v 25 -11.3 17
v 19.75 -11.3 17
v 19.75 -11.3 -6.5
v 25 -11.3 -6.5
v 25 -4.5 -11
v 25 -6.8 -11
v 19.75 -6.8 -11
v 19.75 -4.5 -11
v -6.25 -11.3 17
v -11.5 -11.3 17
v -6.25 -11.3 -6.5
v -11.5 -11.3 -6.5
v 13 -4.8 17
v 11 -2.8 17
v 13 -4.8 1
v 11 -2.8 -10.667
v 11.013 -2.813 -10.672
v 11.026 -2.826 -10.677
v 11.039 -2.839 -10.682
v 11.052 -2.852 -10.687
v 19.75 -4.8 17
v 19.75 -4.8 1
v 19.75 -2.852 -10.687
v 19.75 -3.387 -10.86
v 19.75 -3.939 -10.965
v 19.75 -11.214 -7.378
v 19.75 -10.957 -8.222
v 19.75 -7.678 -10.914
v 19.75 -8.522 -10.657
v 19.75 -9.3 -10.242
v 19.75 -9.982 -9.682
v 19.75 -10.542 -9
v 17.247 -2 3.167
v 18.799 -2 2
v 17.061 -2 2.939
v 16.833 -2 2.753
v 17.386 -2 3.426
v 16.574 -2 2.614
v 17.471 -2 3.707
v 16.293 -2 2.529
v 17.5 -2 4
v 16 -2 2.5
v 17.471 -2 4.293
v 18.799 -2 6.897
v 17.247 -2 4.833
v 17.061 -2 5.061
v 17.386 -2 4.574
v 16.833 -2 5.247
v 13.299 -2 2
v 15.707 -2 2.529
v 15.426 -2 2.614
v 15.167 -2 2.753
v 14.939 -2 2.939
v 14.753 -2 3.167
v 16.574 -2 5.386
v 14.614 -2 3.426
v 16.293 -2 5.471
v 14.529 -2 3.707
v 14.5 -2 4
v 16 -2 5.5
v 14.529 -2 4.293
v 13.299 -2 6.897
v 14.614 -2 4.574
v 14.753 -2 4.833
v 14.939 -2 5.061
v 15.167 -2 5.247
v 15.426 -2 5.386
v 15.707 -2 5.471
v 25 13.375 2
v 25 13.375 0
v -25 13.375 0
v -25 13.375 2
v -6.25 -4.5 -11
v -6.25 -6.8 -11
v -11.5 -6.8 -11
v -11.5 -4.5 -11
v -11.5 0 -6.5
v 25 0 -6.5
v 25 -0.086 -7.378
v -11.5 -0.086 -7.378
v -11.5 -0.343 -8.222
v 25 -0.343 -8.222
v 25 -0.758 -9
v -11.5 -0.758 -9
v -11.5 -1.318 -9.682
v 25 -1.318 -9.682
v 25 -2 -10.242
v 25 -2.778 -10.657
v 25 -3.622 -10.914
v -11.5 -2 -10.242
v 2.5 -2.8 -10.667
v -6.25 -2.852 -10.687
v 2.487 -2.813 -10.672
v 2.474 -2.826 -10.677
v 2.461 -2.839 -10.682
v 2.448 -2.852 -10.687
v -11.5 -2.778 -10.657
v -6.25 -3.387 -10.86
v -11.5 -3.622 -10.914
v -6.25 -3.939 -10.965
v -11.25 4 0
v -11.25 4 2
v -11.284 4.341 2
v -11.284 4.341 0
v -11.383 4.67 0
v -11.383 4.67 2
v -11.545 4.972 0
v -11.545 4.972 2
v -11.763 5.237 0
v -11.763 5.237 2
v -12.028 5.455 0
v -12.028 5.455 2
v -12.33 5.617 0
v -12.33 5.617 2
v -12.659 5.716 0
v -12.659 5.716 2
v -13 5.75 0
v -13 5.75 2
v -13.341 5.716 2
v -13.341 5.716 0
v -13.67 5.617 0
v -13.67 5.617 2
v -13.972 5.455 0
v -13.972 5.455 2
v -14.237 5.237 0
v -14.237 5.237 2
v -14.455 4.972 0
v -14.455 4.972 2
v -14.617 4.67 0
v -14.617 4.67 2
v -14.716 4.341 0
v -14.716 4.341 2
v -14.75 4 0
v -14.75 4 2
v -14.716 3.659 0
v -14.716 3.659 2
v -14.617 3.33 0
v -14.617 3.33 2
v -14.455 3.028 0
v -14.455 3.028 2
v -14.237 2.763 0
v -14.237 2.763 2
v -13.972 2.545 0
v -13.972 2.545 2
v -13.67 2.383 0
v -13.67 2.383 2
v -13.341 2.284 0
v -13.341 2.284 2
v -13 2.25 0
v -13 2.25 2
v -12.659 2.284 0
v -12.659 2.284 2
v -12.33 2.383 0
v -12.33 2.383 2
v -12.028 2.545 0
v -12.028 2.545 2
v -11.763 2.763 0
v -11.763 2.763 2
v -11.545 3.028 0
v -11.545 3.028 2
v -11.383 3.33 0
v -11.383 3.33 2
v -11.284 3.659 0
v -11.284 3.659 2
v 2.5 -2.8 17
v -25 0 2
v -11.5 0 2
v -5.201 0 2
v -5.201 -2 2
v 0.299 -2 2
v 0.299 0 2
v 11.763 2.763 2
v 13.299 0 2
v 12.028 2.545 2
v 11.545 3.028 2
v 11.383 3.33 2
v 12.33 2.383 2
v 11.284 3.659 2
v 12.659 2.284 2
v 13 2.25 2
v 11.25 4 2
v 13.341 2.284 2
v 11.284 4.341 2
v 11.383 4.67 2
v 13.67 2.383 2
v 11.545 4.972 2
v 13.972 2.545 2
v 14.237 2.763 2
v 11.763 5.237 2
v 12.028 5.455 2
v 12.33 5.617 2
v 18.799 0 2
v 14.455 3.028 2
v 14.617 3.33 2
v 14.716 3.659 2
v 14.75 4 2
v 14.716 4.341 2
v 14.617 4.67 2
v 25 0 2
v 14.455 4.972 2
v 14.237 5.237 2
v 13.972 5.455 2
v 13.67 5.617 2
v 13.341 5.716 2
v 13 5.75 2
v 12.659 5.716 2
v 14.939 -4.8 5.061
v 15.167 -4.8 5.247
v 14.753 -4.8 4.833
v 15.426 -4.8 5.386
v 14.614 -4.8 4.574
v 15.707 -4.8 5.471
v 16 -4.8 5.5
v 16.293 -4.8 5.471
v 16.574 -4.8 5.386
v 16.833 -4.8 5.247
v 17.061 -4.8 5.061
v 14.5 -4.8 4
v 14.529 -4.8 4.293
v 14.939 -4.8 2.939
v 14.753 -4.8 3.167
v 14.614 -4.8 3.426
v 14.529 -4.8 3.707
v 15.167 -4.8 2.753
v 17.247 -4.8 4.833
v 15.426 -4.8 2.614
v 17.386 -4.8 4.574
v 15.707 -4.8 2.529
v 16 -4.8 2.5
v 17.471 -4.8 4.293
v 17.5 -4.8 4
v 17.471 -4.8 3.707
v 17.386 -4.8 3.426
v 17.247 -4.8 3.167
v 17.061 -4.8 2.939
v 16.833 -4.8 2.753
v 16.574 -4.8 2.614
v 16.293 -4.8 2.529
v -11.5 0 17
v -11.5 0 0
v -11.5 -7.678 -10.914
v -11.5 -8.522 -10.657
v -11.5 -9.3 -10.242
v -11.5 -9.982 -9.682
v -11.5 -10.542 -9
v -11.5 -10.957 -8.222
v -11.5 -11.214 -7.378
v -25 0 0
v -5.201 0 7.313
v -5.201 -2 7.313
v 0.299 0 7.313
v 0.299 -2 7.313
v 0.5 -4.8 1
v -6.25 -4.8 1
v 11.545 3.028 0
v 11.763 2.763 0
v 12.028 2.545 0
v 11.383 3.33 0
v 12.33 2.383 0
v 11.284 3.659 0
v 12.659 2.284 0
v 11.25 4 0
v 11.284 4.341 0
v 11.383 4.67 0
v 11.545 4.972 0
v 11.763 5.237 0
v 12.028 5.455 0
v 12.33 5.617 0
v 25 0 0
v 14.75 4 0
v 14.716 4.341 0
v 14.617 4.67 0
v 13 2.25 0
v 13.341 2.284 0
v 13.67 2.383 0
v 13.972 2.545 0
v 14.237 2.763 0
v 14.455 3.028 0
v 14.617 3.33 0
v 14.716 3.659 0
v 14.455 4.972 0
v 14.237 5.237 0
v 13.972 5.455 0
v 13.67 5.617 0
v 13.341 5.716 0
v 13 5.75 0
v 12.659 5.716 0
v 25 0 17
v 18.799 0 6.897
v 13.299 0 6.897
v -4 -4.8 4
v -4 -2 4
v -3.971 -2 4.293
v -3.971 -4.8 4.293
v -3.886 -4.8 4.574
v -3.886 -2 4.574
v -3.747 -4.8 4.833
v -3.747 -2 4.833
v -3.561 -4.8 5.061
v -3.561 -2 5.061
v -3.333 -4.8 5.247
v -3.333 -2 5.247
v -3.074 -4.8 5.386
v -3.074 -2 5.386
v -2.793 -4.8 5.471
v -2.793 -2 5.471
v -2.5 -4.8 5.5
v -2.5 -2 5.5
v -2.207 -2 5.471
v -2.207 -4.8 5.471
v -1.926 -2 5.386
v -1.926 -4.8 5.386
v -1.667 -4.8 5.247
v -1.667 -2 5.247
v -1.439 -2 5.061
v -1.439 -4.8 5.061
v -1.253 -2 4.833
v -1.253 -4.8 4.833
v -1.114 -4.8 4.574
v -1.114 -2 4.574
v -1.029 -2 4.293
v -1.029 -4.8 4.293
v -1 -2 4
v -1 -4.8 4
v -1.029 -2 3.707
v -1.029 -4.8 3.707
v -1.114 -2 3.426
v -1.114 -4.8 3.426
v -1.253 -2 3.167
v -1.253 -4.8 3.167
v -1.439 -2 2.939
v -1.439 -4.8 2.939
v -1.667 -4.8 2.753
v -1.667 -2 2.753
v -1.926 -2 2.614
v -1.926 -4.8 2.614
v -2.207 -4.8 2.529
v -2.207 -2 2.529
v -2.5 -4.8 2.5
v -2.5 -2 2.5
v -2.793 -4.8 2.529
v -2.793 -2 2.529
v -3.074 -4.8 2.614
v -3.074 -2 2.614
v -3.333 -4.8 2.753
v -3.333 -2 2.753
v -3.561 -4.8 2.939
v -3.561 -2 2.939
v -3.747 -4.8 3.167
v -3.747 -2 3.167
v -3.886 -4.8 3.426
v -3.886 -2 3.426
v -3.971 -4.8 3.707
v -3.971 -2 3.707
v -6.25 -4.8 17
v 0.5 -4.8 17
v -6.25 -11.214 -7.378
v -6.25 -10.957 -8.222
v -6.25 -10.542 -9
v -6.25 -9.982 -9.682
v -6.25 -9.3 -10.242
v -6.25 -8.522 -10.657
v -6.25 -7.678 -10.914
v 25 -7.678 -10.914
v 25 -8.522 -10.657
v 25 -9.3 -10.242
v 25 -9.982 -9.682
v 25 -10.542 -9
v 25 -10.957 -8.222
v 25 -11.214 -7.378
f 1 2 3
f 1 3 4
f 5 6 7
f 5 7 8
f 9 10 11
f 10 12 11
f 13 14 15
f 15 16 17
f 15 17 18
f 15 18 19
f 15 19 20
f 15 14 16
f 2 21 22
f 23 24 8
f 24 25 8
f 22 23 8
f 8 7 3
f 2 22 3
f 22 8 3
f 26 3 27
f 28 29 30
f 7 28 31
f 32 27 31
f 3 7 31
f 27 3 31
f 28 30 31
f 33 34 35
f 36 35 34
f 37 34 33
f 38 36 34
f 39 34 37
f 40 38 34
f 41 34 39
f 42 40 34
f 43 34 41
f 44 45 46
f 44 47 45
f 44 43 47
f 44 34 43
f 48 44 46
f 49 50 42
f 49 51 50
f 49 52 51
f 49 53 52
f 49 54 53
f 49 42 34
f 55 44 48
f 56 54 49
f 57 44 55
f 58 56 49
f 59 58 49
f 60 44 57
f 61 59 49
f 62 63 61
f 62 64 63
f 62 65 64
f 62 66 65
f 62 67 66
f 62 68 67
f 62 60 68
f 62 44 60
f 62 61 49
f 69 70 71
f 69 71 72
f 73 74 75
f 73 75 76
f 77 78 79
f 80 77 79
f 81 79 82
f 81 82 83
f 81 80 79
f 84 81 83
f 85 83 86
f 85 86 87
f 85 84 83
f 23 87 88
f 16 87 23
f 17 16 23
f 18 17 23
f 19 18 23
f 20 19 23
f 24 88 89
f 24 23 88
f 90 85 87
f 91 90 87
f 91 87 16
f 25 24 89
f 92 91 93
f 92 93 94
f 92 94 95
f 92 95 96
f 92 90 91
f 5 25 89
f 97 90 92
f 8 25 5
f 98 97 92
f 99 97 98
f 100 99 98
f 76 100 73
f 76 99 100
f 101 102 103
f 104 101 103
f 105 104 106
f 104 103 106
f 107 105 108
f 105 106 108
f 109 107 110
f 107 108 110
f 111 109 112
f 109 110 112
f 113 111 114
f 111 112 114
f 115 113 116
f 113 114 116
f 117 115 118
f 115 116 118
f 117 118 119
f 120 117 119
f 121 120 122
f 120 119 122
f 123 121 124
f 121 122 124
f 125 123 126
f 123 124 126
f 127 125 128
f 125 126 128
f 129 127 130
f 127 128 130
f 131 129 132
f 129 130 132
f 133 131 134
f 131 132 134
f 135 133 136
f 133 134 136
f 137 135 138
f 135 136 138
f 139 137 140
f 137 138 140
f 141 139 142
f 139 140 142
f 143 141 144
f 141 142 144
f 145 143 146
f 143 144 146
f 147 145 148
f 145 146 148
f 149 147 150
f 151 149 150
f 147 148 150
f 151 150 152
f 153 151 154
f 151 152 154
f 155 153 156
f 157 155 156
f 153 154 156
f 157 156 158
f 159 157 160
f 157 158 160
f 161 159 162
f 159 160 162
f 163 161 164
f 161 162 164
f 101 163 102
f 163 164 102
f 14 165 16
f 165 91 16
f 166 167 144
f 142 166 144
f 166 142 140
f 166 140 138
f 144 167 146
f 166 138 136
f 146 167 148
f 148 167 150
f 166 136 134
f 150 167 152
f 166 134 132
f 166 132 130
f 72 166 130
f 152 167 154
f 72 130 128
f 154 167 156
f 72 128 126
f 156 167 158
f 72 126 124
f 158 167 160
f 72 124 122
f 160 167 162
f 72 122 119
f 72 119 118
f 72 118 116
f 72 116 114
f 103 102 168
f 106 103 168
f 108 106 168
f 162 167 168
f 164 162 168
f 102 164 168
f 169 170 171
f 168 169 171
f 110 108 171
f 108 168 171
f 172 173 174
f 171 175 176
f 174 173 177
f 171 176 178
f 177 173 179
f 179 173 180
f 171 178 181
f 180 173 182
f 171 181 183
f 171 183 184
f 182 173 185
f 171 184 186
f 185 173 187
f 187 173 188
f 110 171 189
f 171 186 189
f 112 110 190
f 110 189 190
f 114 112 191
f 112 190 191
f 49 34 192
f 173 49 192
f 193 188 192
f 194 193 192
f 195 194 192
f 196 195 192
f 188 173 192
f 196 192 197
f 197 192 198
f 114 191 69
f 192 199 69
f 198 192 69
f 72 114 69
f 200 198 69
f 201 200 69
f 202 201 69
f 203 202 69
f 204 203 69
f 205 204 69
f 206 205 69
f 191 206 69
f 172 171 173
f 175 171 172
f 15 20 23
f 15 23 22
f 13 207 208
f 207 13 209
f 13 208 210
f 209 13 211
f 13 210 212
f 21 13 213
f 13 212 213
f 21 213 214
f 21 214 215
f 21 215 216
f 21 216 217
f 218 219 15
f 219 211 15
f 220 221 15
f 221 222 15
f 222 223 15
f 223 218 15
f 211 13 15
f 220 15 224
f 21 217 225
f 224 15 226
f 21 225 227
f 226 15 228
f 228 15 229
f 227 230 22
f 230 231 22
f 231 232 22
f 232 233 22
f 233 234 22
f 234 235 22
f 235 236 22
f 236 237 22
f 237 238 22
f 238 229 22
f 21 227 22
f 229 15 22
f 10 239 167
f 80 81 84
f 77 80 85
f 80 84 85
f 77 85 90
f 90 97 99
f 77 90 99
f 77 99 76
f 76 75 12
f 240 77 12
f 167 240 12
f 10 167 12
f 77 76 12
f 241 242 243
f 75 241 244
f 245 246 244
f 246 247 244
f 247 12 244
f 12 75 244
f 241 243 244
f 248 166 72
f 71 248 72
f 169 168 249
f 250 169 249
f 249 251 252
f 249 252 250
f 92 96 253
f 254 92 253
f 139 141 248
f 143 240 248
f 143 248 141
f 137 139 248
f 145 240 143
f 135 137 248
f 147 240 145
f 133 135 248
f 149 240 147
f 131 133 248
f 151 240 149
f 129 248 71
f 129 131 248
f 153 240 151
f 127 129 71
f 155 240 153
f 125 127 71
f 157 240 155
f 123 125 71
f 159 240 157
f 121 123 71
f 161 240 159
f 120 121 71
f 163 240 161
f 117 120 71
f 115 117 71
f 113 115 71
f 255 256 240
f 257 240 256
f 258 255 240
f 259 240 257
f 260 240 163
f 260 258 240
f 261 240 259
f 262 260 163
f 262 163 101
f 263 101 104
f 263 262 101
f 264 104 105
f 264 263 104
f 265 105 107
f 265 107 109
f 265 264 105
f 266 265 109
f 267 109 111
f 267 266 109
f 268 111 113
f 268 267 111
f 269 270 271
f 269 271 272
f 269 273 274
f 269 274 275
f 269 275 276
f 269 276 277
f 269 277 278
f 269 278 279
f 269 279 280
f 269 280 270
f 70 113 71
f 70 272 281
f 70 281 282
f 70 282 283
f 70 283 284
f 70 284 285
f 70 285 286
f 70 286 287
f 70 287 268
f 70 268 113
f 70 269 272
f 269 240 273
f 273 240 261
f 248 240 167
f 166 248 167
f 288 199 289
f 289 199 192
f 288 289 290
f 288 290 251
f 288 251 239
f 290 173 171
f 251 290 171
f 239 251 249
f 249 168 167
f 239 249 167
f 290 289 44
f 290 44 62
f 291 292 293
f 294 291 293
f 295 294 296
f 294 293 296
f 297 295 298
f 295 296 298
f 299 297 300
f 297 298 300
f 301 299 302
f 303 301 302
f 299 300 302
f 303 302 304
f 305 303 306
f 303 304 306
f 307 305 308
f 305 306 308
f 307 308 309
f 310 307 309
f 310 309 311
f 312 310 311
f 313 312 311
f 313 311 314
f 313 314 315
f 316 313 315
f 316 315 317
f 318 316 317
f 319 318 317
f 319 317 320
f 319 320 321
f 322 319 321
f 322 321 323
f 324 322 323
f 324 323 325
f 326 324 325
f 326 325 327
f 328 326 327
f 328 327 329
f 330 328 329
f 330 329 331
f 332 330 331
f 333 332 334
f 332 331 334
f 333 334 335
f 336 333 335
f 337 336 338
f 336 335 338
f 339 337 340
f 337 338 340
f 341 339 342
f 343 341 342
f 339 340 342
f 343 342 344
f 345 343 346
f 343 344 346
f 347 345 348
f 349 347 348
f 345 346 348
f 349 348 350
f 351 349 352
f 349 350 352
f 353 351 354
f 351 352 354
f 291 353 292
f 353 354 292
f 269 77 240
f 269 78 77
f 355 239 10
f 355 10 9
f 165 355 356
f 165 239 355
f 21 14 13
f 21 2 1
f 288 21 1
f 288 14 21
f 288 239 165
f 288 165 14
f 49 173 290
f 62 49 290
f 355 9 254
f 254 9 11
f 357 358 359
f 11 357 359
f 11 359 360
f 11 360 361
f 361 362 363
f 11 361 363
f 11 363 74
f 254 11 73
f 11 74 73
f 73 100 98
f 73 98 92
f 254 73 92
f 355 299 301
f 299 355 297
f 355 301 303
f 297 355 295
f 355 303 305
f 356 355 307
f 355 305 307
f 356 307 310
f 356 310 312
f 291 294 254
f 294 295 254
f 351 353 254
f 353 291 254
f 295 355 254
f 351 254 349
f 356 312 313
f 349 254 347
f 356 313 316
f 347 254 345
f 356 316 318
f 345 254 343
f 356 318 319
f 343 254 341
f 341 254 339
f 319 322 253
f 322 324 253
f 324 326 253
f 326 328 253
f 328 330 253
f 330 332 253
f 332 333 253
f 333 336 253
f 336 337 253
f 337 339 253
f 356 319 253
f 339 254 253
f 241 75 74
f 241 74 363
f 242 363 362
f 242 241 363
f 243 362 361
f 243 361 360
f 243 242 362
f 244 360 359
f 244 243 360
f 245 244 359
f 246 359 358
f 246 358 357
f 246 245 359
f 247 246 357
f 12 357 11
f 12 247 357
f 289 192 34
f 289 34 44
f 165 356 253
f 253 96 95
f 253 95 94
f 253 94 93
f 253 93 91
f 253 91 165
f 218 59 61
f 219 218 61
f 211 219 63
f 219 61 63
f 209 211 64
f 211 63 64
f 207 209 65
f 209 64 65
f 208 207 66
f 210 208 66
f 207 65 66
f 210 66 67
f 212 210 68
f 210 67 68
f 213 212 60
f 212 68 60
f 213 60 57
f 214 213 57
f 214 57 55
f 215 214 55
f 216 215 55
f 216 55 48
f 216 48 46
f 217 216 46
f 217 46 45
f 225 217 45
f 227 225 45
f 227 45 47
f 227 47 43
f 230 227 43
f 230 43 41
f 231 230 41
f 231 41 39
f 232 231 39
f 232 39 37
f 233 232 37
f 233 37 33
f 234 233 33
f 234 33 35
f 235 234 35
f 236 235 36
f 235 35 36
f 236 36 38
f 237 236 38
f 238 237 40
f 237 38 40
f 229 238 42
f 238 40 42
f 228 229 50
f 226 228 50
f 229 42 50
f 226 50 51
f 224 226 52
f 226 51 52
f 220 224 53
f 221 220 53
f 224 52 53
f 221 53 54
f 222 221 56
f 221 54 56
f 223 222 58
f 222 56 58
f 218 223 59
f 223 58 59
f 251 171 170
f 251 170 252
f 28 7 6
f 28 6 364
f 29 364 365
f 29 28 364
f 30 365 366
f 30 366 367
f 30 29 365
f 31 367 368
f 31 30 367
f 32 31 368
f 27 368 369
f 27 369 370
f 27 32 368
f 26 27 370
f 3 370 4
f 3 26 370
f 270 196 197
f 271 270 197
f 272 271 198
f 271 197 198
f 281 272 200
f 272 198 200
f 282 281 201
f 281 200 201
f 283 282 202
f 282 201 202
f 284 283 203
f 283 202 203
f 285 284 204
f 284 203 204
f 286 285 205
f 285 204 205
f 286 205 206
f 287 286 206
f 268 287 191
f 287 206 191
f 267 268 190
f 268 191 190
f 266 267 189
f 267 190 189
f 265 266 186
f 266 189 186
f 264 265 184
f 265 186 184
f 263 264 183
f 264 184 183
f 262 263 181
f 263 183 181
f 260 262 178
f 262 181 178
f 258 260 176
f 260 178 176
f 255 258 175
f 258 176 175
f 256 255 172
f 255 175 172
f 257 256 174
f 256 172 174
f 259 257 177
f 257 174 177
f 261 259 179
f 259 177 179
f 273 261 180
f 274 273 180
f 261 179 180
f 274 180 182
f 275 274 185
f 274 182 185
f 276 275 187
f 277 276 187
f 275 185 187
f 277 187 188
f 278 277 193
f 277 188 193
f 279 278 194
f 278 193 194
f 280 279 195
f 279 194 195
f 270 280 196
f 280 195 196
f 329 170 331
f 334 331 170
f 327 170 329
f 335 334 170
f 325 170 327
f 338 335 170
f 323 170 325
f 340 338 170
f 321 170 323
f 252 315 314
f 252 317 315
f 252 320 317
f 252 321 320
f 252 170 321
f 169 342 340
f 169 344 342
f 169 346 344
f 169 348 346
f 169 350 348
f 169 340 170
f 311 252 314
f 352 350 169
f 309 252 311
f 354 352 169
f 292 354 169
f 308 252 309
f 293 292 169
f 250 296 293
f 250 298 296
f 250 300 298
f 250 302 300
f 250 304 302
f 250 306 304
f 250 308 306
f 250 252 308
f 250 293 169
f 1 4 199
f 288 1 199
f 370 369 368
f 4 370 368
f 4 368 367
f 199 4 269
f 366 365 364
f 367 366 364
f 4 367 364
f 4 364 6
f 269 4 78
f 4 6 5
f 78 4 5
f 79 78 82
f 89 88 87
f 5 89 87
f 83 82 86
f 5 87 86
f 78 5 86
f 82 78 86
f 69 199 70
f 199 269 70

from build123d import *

# Parameters (mm, degrees)
F0_W           = 13.375
F0_H           = 2
F1_DEPTH       = 25
F2_R           = 1.75
F3_DEPTH       = 2
F4_W           = 11.3
F4_H           = 13
F5_DEPTH       = 25
F5_DEPTH_BACK  = 11.5
F6_W           = 26
F6_H           = 6.5
F7_DEPTH       = 13
F9_DEPTH       = 13
F11_DEPTH      = 19.75
F11_DEPTH_BACK = 6.25
F13_T1_DEPTH   = 27.75
F13_T3_DEPTH   = 27.75
F13_T5_DEPTH   = 59
F15_DEPTH      = 15
F16_W          = 5.5
F16_H          = 4.8968277758
F16_H_2        = 5.3132384717
F17_DEPTH      = 2
F18_DEPTH      = 2
F19_D          = 3


# Not quite as in the source:
# - a fillet or chamfer that OpenCascade refuses, or shapes differently, is made with other operations: its cross-section is extruded or revolved along the edge and cut away or added


with BuildPart() as f1:
    # F0 (on Right) → F1 (new body, symmetric)
    with BuildSketch(Plane.YZ):
        with Locations((6.6875, 1)):
            Rectangle(F0_W, F0_H)
    extrude(amount=F1_DEPTH, both=True)

    # F2 (on face) → F3 (cut, through all)
    with BuildSketch(Plane.XY.offset(2)):
        with Locations((-13, 4)):
            Circle(F2_R)
        with Locations((13, 4)):
            Circle(F2_R)
    extrude(amount=-F3_DEPTH, mode=Mode.SUBTRACT)

    # F4 (on Right) → F5 (join, two sides)
    with BuildSketch(Plane.YZ) as f5_sk:
        with Locations((-5.65, -4.5)):
            Rectangle(F4_W, F4_H)
    extrude(amount=F5_DEPTH)
    extrude(f5_sk.sketch, amount=-F5_DEPTH_BACK)

    # F6 (on face) → F7 (cut, through all)
    with BuildSketch(Plane(origin=(0, 0, -11), x_dir=(1, 0, 0), z_dir=(0, 0, -1))):
        with Locations((6.75, 8.05)):
            Rectangle(F6_W, F6_H)
    extrude(amount=-F7_DEPTH, mode=Mode.SUBTRACT)

    # F8 (on face) → F9 (cut, through all)
    with BuildSketch(Plane(origin=(0, 0, -11), x_dir=(1, 0, 0), z_dir=(0, 0, -1))):
        Polygon((13, 4.8), (0.5, 4.8), (2.5, 2.8), (11, 2.8), align=None)
    extrude(amount=-F9_DEPTH, mode=Mode.SUBTRACT)

    # F10 (on Right) → F11 (cut, two sides)
    with BuildSketch(Plane.YZ) as f11_sk:
        Polygon((-4.8, -11), (-2.8, -11), (-4.8, 1), align=None)
    extrude(amount=F11_DEPTH, mode=Mode.SUBTRACT)
    extrude(f11_sk.sketch, amount=-F11_DEPTH_BACK, mode=Mode.SUBTRACT)

    # F13: fillet of radius 4.5 on 3 edges, made by hand

    # F13_s2 → F13_t1 (cut)
    with BuildSketch(Plane.YZ.offset(-22.75)):
        with BuildLine():
            ThreePointArc((-6.8, -11), (-9.9819805153, -9.6819805153), (-11.3, -6.5))
            Line((-11.3, -6.5), (-11.3, -11))
            Line((-11.3, -11), (-6.8, -11))
        make_face()
    extrude(amount=F13_T1_DEPTH, mode=Mode.SUBTRACT)

    # F13_s4 → F13_t3 (cut)
    with BuildSketch(Plane.YZ.offset(8.5)):
        with BuildLine():
            ThreePointArc((-6.8, -11), (-9.9819805153, -9.6819805153), (-11.3, -6.5))
            Line((-11.3, -6.5), (-11.3, -11))
            Line((-11.3, -11), (-6.8, -11))
        make_face()
    extrude(amount=F13_T3_DEPTH, mode=Mode.SUBTRACT)

    # F13_s6 → F13_t5 (cut)
    with BuildSketch(Plane.YZ.offset(-22.75)):
        with BuildLine():
            ThreePointArc((0, -6.5), (-1.3180194847, -9.6819805153), (-4.5, -11))
            Line((-4.5, -11), (0, -11))
            Line((0, -11), (0, -6.5))
        make_face()
    extrude(amount=F13_T5_DEPTH, mode=Mode.SUBTRACT)

    # F14 (on face) → F15 (join)
    with BuildSketch(Plane.XY.offset(2)):
        Polygon((25, 0), (-11.5, 0), (-11.5, -11.3), (-6.25, -11.3), (-6.25, -4.8), (0.5, -4.8), (2.5, -2.8), (11, -2.8), (13, -4.8), (19.75, -4.8), (19.75, -11.3), (25, -11.3), align=None)
    extrude(amount=F15_DEPTH)

    # F16 (on face) → F17 (join)
    with BuildSketch(Plane(origin=(0, 0, 0), x_dir=(-1, 0, 0), z_dir=(0, 1, 0))):
        with Locations((-16.04918, 4.4484138879)):
            Rectangle(F16_W, F16_H)
        with Locations((2.45082, 4.6566192359)):
            Rectangle(F16_W, F16_H_2)
    extrude(amount=-F17_DEPTH)

    # F16 (on face) → F18 (cut)
    with BuildSketch(Plane(origin=(0, 0, 0), x_dir=(-1, 0, 0), z_dir=(0, 1, 0))):
        with Locations((-16.04918, 4.4484138879)):
            Rectangle(F16_W, F16_H)
        with Locations((2.45082, 4.6566192359)):
            Rectangle(F16_W, F16_H_2)
    extrude(amount=-F18_DEPTH, mode=Mode.SUBTRACT)

    # F19 (through all)
    with Locations(Plane.XZ.offset(4.8)):
        with Locations((16, 4), (-2.5, 4)):
            Hole(F19_D / 2)


solid = f1.part
